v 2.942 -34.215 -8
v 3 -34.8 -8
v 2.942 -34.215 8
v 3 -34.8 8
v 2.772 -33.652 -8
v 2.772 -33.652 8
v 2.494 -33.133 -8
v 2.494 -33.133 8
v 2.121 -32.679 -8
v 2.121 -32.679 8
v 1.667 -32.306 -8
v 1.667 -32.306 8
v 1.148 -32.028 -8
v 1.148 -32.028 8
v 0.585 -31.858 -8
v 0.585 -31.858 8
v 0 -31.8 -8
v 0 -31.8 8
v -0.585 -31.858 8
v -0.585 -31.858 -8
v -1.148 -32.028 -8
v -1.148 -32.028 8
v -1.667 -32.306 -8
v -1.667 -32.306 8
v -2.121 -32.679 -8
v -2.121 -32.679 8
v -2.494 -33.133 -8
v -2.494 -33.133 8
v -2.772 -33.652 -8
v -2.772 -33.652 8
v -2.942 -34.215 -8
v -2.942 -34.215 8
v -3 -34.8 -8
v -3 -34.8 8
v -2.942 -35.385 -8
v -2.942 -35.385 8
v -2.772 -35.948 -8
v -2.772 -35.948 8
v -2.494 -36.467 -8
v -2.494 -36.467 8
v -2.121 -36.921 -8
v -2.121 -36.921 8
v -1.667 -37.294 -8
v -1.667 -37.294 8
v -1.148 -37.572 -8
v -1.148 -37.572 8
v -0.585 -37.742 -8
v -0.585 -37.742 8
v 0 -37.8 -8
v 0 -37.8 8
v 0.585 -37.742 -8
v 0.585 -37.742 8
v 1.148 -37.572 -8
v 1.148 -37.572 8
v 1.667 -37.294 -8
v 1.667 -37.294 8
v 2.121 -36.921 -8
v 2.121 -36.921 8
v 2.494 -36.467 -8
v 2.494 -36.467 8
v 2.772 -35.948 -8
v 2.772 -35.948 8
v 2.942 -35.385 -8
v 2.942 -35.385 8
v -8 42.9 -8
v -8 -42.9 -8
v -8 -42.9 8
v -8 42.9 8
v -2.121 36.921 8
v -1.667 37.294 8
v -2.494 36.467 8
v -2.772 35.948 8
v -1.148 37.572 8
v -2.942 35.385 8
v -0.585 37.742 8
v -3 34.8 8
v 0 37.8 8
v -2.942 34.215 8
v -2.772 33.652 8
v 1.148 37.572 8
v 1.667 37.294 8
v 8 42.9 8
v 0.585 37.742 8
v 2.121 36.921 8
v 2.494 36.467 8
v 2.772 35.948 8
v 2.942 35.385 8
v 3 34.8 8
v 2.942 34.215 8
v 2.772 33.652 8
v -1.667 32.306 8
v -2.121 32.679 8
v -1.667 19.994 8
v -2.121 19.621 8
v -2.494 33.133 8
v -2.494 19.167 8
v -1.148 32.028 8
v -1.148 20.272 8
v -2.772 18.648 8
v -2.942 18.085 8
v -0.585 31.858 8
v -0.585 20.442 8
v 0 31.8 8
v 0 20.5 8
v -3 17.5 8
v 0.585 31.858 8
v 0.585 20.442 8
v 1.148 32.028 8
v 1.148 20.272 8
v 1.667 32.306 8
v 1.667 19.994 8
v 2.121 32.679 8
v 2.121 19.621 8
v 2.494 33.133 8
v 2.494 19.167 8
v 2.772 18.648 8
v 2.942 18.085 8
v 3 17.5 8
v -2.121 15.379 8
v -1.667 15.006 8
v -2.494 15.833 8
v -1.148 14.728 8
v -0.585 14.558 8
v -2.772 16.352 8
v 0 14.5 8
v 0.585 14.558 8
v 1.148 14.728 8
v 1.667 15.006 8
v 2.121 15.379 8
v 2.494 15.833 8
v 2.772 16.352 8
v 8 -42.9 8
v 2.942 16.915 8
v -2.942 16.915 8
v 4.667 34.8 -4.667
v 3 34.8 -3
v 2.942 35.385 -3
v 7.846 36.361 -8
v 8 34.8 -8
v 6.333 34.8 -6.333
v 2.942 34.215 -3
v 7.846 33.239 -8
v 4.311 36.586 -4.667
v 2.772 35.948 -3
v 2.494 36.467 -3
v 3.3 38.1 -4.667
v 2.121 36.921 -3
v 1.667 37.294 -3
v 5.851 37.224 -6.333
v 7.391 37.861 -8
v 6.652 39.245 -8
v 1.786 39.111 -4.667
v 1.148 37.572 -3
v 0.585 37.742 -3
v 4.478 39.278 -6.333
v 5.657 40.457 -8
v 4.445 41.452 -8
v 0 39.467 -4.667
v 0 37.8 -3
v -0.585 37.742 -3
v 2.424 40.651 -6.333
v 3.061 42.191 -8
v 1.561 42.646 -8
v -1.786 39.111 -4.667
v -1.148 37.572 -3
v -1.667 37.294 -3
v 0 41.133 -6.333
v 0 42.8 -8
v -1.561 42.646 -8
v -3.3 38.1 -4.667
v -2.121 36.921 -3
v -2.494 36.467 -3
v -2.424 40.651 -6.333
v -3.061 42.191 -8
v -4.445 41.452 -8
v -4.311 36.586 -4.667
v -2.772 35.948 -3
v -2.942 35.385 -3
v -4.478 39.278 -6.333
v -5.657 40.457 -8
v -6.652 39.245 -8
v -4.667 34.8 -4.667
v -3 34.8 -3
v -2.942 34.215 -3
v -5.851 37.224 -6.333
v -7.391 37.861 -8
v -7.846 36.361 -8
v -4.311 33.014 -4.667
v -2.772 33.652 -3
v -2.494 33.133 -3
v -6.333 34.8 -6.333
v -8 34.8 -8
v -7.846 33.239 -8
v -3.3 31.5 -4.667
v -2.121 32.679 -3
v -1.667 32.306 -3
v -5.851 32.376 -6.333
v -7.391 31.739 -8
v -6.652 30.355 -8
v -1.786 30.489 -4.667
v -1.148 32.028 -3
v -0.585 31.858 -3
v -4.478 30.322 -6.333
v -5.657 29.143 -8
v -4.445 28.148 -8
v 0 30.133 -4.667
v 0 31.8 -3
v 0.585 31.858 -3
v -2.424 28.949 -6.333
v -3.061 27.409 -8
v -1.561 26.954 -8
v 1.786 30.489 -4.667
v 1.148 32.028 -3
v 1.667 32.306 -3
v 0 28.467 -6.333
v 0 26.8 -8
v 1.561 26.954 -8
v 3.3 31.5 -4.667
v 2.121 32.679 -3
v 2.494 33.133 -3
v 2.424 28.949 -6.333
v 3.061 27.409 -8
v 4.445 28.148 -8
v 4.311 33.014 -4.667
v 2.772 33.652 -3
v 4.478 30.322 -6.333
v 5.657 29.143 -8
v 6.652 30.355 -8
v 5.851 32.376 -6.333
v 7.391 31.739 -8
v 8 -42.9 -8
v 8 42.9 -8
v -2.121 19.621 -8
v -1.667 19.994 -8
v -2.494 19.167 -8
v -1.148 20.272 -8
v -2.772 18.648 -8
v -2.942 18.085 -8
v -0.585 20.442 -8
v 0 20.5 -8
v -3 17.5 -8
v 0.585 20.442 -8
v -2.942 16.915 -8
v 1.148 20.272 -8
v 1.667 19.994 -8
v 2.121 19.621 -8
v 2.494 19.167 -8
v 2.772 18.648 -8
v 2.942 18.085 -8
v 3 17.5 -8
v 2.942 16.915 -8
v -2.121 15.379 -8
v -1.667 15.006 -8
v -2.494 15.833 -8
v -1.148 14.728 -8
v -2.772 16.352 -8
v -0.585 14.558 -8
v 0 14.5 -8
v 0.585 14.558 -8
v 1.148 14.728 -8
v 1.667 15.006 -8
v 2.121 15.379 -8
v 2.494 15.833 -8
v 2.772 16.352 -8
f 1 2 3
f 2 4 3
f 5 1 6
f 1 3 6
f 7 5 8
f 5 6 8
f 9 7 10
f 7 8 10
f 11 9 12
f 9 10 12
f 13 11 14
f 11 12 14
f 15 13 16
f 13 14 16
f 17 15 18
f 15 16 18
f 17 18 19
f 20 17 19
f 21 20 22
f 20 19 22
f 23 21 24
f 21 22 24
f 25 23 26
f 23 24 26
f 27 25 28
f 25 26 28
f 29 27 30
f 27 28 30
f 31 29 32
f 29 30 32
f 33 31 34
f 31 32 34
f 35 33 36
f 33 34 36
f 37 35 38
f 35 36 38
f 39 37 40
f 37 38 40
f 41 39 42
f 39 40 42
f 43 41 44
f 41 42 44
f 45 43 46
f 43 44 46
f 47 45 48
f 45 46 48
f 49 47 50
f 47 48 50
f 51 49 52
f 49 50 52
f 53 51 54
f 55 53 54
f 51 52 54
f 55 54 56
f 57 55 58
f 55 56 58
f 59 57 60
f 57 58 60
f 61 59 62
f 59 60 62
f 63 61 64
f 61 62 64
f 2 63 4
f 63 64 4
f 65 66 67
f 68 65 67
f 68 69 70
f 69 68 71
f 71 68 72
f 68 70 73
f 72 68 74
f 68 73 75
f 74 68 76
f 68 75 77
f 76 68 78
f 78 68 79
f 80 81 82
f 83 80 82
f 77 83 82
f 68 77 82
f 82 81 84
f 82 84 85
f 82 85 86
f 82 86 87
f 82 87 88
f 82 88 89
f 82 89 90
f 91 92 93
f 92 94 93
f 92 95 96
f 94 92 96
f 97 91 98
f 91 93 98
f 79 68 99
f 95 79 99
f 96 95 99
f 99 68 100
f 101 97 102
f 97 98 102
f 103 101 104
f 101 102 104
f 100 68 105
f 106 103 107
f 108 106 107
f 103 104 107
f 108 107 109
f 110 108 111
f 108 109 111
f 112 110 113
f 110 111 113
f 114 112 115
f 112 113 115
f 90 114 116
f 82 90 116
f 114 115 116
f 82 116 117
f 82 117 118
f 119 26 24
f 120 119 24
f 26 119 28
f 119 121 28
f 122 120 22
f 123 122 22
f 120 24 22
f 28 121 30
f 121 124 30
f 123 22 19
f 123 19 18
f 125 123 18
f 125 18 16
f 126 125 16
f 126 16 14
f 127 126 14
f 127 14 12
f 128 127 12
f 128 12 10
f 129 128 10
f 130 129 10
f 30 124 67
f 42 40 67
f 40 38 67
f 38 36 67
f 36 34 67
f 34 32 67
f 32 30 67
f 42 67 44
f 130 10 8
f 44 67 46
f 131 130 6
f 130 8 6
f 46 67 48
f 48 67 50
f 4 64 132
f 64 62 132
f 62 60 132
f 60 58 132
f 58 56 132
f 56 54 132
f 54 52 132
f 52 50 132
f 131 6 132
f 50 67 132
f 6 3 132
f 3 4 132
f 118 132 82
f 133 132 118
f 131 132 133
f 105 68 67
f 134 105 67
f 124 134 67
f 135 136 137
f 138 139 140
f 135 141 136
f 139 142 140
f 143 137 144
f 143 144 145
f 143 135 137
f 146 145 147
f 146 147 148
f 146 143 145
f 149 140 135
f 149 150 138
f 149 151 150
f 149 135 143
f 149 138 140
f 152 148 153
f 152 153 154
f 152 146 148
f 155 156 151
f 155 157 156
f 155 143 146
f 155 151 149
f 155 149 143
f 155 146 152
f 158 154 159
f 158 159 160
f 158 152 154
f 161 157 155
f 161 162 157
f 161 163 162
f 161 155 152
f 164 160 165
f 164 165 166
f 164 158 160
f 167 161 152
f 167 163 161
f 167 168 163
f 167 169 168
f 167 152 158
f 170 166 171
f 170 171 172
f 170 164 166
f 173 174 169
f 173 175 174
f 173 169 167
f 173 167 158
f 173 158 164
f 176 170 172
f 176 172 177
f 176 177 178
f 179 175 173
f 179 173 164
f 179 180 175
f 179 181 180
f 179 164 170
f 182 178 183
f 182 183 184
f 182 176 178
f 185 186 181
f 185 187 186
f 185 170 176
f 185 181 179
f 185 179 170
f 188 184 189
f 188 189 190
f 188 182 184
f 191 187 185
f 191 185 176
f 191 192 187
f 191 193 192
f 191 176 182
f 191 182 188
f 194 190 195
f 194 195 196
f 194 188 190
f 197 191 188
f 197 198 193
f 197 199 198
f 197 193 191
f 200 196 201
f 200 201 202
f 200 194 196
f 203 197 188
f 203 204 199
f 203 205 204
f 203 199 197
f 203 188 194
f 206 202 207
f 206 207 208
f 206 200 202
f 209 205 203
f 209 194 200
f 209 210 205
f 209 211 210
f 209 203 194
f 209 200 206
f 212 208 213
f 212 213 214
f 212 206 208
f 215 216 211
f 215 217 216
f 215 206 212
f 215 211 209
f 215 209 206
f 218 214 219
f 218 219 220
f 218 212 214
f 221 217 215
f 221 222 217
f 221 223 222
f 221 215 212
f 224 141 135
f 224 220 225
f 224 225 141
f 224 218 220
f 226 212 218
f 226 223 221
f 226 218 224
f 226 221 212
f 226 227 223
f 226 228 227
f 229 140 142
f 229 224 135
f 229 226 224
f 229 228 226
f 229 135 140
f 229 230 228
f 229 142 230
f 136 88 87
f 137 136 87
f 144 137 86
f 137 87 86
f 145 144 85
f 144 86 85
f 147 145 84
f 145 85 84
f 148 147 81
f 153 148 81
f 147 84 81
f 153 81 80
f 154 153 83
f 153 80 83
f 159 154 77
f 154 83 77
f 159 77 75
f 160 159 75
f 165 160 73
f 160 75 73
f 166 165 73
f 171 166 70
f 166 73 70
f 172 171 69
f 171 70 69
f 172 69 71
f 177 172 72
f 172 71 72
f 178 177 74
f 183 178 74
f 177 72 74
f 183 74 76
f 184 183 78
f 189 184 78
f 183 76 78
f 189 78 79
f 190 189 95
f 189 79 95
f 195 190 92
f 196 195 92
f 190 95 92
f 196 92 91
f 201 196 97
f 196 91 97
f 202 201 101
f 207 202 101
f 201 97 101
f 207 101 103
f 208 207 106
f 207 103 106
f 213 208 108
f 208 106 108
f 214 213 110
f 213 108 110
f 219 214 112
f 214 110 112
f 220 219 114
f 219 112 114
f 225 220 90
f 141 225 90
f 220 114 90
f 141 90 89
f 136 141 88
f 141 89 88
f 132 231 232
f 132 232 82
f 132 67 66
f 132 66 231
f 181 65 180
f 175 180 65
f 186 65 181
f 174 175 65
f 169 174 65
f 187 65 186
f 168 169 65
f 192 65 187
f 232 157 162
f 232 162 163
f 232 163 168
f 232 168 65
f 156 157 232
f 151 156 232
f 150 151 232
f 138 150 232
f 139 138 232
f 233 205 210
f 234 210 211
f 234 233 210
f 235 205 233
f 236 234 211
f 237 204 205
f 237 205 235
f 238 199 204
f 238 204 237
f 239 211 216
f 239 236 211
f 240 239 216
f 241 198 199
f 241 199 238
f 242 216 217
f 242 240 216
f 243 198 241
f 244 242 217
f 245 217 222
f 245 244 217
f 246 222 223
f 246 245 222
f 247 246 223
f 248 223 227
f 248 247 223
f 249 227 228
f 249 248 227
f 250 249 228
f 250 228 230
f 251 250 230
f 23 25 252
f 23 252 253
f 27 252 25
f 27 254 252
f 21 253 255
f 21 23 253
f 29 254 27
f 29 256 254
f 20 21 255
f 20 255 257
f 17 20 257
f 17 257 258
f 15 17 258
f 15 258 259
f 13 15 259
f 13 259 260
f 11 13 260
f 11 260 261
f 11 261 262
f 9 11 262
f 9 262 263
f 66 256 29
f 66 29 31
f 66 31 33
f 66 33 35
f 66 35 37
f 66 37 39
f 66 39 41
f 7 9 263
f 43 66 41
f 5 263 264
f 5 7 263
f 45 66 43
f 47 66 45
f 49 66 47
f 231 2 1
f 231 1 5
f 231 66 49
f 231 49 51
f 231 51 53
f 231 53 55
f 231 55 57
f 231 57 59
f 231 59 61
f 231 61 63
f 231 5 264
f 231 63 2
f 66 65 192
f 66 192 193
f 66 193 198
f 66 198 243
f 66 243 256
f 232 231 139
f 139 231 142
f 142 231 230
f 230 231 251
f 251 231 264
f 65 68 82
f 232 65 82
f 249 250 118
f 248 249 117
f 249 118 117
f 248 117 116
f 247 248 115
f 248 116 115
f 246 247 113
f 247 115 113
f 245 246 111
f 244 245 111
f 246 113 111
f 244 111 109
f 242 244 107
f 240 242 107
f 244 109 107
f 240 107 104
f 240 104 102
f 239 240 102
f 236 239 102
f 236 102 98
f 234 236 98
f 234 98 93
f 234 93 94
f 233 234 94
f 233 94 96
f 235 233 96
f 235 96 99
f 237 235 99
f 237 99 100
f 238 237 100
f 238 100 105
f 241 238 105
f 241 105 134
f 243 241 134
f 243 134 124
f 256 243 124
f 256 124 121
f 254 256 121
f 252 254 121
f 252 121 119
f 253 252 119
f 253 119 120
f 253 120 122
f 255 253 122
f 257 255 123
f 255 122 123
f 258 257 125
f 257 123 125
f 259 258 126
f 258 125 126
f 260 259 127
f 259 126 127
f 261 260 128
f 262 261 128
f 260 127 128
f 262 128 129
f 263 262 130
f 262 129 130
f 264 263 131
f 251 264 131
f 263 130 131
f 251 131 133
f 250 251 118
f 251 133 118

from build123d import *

# Parameters (mm, degrees)
F5_W     = 16
F5_H     = 16
F6_DEPTH = 42.9
F0_R     = 3
F7_DEPTH = 12.5
F2_SIZE  = 4.99999
F3_R     = 3
F4_DEPTH = 16.001


# Not quite as in the source:
# - a fillet or chamfer is up to 0.001 mm smaller than in the source, because OpenCascade refuses the exact size


with BuildPart() as f6:
    # F5 (on Front) → F6 (new body, symmetric)
    with BuildSketch(Plane.XZ):
        Rectangle(F5_W, F5_H)
    extrude(amount=F6_DEPTH, both=True)

    # F0 (on Top) → F7 (cut, symmetric)
    with BuildSketch(Plane.XY):
        with Locations((0, -34.8)):
            Circle(F0_R)
        with Locations((0, 34.8)):
            Circle(F0_R)
    extrude(amount=F7_DEPTH, both=True, mode=Mode.SUBTRACT)

    # F2 (size 5 in the source; OpenCascade refuses exactly that, so slightly less here)
    f2_edges = [f6.edges().sort_by_distance(p)[0] for p in [
        (-3, 34.8, -8),
    ]]
    chamfer(f2_edges, length=F2_SIZE)

    # F3 (on face) → F4 (cut, through all)
    with BuildSketch(Plane.XY.offset(8)):
        with Locations((0, 17.5)):
            Circle(F3_R)
    extrude(amount=-F4_DEPTH, mode=Mode.SUBTRACT)


solid = f6.part
